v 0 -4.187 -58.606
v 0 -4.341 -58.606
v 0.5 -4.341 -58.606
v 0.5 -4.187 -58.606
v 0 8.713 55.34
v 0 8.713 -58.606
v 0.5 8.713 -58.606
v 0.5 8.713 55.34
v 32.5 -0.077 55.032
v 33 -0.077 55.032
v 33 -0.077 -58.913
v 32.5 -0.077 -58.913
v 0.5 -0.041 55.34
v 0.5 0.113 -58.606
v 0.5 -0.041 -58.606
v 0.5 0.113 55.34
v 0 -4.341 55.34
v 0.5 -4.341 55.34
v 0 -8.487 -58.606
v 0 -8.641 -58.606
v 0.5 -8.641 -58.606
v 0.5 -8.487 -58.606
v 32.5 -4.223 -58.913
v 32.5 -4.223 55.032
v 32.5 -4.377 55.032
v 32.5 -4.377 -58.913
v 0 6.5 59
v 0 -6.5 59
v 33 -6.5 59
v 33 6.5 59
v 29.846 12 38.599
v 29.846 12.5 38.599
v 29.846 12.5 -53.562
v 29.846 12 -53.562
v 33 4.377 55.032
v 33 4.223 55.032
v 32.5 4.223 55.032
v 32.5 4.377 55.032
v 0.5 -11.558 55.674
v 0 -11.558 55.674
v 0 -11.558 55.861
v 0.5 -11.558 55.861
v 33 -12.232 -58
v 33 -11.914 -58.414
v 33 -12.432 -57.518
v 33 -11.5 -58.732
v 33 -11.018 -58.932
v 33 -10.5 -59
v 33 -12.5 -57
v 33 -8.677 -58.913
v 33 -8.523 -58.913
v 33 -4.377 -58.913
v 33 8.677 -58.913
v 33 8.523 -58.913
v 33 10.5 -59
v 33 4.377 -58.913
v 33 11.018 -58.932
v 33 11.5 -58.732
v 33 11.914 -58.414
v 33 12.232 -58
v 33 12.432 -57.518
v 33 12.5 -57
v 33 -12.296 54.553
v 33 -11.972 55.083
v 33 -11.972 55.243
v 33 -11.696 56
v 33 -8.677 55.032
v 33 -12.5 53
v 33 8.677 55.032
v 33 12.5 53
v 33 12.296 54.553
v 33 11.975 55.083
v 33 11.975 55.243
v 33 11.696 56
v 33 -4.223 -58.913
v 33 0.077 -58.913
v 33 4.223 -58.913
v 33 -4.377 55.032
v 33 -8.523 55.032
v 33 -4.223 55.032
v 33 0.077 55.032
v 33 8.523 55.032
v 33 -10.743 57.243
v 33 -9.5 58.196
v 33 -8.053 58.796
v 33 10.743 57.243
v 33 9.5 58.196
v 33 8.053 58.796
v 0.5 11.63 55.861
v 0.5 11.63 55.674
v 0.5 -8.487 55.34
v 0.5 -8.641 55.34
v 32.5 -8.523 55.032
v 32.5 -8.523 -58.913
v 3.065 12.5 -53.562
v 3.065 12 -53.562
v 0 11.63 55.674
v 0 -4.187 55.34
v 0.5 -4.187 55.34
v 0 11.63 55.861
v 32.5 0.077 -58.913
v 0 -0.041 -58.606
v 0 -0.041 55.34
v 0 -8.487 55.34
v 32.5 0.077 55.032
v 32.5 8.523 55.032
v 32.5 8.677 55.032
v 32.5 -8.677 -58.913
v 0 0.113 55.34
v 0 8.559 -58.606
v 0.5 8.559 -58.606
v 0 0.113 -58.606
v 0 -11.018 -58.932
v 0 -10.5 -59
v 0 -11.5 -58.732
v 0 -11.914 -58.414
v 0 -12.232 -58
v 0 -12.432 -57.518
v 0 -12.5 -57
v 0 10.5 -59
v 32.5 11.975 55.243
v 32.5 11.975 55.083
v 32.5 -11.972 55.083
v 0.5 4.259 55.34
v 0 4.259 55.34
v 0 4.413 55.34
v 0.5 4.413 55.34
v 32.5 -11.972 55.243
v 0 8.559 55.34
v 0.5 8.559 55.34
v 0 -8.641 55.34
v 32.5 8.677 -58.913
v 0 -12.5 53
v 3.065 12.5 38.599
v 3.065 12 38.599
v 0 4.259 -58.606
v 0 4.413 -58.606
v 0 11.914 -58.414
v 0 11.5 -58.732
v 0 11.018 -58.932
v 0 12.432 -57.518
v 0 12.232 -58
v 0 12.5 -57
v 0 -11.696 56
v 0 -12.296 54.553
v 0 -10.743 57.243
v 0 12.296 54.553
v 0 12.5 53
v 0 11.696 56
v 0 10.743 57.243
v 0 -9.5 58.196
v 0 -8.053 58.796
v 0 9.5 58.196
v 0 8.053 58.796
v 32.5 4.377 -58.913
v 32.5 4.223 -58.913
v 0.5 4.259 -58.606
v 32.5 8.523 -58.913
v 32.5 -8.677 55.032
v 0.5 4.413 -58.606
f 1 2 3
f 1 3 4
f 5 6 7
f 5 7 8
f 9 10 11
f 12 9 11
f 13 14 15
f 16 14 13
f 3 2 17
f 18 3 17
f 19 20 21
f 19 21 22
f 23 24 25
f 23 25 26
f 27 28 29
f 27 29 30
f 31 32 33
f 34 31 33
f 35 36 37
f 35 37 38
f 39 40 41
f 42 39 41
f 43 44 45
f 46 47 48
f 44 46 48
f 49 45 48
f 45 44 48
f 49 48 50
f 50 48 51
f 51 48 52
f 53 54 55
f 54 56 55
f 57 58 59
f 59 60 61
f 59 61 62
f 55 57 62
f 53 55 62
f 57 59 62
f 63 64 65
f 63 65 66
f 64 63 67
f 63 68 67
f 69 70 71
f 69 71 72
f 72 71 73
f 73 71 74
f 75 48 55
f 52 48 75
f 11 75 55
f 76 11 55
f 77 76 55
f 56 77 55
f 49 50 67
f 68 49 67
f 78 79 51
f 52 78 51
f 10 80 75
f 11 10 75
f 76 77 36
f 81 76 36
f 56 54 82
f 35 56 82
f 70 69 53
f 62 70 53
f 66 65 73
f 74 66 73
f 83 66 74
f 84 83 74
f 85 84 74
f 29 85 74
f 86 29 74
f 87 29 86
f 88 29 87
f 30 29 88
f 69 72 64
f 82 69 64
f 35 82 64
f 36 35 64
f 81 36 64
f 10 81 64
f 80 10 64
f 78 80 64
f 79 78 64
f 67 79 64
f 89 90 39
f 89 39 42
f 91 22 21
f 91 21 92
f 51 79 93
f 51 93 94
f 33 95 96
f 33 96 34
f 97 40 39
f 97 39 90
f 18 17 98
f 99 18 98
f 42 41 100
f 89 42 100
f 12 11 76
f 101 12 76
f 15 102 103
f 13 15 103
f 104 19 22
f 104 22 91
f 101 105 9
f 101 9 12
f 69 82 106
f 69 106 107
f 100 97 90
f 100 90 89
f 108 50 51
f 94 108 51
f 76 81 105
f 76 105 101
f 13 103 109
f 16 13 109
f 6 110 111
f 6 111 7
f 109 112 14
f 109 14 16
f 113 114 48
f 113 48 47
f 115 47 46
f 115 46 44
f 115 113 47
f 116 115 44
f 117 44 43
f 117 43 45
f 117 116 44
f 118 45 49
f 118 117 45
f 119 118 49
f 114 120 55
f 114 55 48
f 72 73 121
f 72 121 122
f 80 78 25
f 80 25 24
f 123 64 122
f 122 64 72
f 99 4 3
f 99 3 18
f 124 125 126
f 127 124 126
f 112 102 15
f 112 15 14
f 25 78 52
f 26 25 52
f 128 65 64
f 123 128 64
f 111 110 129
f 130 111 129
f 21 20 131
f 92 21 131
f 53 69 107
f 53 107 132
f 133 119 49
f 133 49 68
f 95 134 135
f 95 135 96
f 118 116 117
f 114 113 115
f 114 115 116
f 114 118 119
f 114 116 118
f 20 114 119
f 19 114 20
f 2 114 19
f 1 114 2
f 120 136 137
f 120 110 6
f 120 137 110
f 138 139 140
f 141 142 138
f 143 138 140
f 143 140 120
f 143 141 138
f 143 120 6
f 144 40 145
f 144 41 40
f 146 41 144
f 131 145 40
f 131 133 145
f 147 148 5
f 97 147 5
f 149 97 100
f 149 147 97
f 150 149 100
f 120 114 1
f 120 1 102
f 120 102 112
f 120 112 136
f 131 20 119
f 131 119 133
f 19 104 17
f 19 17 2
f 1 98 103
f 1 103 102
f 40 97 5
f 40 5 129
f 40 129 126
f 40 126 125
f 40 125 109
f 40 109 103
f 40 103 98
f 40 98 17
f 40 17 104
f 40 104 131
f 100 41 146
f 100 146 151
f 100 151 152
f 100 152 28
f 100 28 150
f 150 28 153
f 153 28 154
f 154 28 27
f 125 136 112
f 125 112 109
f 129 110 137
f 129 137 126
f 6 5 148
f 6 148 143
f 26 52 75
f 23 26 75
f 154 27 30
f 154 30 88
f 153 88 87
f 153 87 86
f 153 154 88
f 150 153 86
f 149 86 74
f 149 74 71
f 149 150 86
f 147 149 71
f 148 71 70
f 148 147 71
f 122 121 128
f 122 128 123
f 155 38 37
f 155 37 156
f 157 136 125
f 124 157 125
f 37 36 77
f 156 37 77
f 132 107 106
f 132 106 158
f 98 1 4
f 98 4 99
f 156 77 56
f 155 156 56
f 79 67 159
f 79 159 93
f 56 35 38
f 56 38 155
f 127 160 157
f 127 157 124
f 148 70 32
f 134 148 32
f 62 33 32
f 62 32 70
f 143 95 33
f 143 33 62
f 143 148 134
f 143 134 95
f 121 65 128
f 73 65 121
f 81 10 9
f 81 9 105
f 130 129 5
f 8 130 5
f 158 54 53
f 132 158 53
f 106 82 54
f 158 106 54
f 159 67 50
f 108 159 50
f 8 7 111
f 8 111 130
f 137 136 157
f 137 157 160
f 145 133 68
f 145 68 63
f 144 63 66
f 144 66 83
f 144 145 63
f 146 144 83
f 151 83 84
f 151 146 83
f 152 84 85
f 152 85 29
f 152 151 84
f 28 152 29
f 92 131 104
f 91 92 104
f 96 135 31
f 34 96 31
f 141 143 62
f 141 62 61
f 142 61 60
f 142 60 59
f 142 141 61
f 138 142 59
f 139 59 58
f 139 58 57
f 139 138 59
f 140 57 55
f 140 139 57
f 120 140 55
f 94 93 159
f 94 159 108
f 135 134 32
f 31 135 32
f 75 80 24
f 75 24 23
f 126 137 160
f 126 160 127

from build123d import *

# Parameters (mm, degrees)
EXTRUDE_1_DEPTH     = 33
SKETCH_2_W          = 113.94546963
SKETCH_2_H          = 0.153731759
SKETCH_2_W_2        = 0.159880439
SKETCH_2_H_2        = 23.946679257
CUT_EXTRUDE_1_DEPTH = 0.5
SKETCH_3_W          = 113.94546963
SKETCH_3_H          = 0.153731759
SKETCH_3_W_2        = 0.186483874
SKETCH_3_H_2        = 23.188530915
CUT_EXTRUDE_2_DEPTH = 0.5
SKETCH_4_W          = 26.780776055
SKETCH_4_H          = 92.160179523
CUT_EXTRUDE_3_DEPTH = 0.5


with BuildPart() as part:
    # 草图1 → 凸台-拉伸1 (new body)
    with BuildSketch(Plane(origin=(0, 0, 0), x_dir=(0, 0, -1), z_dir=(1, 0, 0))):
        with BuildLine():
            Line((-53, 12.5), (57, 12.5))
            ThreePointArc((57, 12.5), (58.414213562, 11.914213562), (59, 10.5))
            Line((59, 10.5), (59, -10.5))
            ThreePointArc((59, -10.5), (58.414213562, -11.914213562), (57, -12.5))
            Line((57, -12.5), (-53, -12.5))
            ThreePointArc((-53, -12.5), (-57.242640687, -10.742640687), (-59, -6.5))
            Line((-59, -6.5), (-59, 6.5))
            ThreePointArc((-59, 6.5), (-57.242640687, 10.742640687), (-53, 12.5))
        make_face()
    extrude(amount=EXTRUDE_1_DEPTH)

    # 草图2 → 切除-拉伸1 (cut)
    with BuildSketch(Plane(origin=(33, 0, 0), x_dir=(0, 0, -1), z_dir=(1, 0, 0))):
        with Locations((1.940270858, 4.299962397)):
            Rectangle(SKETCH_2_W, SKETCH_2_H)
        with Locations((1.940270858, -3.7603e-05)):
            Rectangle(SKETCH_2_W, SKETCH_2_H)
        with Locations((1.940270858, 8.599962398)):
            Rectangle(SKETCH_2_W, SKETCH_2_H)
        with Locations((1.940270858, -4.300037602)):
            Rectangle(SKETCH_2_W, SKETCH_2_H)
        with Locations((1.940270858, -8.600037603)):
            Rectangle(SKETCH_2_W, SKETCH_2_H)
        with Locations((-55.163355852, 0.001170191)):
            Rectangle(SKETCH_2_W_2, SKETCH_2_H_2)
    extrude(amount=-CUT_EXTRUDE_1_DEPTH, mode=Mode.SUBTRACT)

    # 草图3 → 切除-拉伸2 (cut)
    with BuildSketch(Plane.ZY):
        with Locations((-1.632775224, 4.336078297)):
            Rectangle(SKETCH_3_W, SKETCH_3_H)
        with Locations((-1.632775224, 0.036078297)):
            Rectangle(SKETCH_3_W, SKETCH_3_H)
        with Locations((-1.632775224, 8.636078297)):
            Rectangle(SKETCH_3_W, SKETCH_3_H)
        with Locations((-1.632775224, -4.263921704)):
            Rectangle(SKETCH_3_W, SKETCH_3_H)
        with Locations((-1.632775224, -8.563921704)):
            Rectangle(SKETCH_3_W, SKETCH_3_H)
        with Locations((55.767421869, 0.036078296)):
            Rectangle(SKETCH_3_W_2, SKETCH_3_H_2)
    extrude(amount=-CUT_EXTRUDE_2_DEPTH, mode=Mode.SUBTRACT)

    # 草图4 → 切除-拉伸3 (cut)
    with BuildSketch(Plane(origin=(0, 12.5, 0), x_dir=(1, 0, 0), z_dir=(0, 1, 0))):
        with Locations((16.455758173, 7.48146235)):
            Rectangle(SKETCH_4_W, SKETCH_4_H)
    extrude(amount=-CUT_EXTRUDE_3_DEPTH, mode=Mode.SUBTRACT)


solid = part.part
